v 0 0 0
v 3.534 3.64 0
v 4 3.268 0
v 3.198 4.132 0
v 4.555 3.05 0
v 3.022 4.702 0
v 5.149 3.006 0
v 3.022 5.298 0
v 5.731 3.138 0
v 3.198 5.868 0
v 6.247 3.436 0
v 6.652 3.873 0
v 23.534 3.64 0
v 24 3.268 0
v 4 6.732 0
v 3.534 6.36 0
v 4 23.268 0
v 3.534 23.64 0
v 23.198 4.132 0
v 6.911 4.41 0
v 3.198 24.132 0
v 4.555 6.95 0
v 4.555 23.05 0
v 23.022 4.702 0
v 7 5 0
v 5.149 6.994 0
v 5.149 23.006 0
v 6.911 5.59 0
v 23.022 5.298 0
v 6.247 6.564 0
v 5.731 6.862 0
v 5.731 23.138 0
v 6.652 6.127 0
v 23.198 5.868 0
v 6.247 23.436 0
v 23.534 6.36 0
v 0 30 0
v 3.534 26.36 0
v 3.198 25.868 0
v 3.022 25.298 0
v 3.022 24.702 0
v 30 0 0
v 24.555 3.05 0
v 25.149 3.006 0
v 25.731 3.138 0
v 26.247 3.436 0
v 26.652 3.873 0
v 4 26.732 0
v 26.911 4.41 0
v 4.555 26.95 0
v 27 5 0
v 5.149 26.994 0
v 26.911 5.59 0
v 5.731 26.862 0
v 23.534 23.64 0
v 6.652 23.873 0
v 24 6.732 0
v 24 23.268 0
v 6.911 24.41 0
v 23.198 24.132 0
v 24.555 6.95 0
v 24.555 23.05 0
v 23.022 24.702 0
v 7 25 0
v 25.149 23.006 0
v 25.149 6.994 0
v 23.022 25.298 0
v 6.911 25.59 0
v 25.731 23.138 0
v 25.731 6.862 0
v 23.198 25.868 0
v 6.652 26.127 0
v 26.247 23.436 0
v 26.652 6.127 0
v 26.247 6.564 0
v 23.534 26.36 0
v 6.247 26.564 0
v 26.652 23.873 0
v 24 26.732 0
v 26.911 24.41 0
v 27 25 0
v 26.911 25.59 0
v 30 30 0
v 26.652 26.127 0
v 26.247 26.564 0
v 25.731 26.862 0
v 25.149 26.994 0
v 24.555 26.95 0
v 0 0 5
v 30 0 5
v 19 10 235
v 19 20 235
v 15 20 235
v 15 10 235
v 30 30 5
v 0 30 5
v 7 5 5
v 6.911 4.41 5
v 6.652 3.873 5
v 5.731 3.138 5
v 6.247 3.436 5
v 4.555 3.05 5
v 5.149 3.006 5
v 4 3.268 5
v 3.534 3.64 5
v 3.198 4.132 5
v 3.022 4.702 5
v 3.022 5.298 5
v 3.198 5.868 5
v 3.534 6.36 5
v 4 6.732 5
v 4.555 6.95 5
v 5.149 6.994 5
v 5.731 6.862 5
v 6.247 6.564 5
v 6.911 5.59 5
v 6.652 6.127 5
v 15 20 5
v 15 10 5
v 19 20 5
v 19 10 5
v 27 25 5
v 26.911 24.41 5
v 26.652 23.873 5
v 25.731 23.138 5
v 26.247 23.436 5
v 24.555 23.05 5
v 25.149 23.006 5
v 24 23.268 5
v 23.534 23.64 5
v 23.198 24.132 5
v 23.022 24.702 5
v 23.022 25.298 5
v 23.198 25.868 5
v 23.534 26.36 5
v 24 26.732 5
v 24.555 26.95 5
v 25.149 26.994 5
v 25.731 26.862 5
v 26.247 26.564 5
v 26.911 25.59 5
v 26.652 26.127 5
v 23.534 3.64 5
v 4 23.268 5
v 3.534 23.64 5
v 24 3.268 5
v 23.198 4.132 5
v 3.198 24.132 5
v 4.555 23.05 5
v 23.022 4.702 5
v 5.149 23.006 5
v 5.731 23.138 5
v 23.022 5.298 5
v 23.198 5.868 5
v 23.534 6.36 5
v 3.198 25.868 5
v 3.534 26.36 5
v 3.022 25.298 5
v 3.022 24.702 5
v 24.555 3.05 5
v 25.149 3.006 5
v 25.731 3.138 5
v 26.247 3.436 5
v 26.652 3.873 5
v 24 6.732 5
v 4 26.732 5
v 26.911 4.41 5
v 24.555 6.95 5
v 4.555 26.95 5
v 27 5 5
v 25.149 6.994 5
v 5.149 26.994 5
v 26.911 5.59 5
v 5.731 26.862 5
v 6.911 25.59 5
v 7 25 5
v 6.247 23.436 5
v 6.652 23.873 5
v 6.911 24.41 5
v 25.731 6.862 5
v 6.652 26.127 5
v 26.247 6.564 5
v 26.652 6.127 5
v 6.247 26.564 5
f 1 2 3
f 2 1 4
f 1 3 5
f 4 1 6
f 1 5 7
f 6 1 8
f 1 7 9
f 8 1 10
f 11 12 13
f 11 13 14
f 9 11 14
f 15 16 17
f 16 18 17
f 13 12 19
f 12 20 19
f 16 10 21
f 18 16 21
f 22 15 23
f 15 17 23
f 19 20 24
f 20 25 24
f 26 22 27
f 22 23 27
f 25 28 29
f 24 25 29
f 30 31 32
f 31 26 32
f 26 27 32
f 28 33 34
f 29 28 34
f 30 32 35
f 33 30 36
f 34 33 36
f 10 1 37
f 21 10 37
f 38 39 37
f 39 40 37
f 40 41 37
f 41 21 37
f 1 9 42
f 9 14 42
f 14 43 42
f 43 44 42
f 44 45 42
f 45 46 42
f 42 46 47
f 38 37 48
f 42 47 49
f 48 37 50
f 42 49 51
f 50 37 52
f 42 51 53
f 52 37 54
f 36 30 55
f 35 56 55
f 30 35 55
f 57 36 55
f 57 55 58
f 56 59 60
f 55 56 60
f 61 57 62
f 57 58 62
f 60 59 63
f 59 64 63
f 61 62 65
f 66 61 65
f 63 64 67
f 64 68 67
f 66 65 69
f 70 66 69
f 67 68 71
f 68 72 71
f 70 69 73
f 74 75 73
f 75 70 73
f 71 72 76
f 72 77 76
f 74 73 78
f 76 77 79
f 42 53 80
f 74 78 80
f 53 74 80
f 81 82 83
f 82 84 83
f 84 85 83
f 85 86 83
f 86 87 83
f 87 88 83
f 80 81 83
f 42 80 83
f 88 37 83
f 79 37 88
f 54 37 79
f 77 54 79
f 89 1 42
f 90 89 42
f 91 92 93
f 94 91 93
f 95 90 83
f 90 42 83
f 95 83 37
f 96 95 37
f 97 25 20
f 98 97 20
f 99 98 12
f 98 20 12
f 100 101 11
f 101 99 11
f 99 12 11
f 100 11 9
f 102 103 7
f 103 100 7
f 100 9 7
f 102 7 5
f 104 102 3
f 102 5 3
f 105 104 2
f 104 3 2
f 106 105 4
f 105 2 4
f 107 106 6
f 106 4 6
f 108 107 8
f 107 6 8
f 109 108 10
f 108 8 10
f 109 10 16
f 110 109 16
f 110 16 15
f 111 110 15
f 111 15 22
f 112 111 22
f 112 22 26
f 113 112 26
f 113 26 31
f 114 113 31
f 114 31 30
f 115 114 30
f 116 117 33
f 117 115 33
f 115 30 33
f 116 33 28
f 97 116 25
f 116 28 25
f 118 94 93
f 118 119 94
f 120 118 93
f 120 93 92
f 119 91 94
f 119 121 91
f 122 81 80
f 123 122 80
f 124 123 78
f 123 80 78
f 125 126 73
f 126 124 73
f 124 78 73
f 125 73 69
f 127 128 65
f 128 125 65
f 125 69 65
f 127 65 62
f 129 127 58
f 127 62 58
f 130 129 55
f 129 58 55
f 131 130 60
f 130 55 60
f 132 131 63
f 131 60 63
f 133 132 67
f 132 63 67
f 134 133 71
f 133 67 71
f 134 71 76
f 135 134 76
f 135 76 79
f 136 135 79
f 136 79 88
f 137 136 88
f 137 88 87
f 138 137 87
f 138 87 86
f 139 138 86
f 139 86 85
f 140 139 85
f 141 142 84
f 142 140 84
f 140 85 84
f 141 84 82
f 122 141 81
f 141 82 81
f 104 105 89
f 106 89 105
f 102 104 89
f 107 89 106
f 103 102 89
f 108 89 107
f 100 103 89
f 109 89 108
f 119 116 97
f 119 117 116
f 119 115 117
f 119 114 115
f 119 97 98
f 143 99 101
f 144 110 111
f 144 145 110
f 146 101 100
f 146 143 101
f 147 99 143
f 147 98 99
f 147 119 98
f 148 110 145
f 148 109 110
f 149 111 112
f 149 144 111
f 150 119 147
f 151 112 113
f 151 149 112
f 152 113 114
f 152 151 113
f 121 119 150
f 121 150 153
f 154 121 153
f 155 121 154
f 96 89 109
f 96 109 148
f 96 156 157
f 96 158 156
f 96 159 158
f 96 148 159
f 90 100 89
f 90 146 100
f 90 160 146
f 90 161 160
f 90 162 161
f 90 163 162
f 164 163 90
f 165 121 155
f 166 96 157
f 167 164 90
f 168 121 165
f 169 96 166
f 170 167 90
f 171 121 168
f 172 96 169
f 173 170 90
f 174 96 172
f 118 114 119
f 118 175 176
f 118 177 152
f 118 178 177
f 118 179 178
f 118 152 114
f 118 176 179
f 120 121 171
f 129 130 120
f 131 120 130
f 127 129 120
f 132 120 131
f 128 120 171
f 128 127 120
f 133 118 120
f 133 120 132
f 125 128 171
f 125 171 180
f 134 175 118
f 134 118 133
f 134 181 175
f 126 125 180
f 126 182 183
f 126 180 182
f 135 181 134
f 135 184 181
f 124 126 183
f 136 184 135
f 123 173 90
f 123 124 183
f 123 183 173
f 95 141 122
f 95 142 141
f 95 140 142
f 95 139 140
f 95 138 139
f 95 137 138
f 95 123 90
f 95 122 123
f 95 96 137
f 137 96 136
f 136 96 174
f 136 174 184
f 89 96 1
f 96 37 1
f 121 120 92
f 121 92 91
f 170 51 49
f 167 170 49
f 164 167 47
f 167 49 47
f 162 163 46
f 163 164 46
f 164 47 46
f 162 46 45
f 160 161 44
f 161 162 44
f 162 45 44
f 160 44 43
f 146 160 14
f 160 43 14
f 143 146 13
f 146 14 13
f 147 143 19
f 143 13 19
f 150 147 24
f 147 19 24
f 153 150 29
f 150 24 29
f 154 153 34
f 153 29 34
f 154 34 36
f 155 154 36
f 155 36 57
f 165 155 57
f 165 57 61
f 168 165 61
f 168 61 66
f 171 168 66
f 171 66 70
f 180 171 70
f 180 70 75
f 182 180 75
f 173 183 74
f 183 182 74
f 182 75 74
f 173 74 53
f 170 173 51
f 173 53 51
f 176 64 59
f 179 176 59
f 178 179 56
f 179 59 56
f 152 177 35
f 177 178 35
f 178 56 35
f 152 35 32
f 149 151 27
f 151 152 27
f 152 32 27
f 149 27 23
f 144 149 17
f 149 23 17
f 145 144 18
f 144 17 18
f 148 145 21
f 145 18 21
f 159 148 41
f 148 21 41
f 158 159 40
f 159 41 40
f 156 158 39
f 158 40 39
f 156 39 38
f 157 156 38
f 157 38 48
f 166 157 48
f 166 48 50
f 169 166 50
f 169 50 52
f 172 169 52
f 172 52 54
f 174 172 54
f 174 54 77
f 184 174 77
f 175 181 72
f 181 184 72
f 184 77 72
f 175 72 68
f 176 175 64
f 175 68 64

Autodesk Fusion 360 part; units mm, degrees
sketch "Sketch1" plane through (0, 0, 0) normal (0, 0, 1) x (1, 0, 0)
  line L0 (0, 0) -> (30, 0)
  line L1 (30, 0) -> (30, 30)
  line L2 (30, 30) -> (0, 30)
  line L3 (0, 30) -> (0, 0)
  circle A0 centre (5, 25) radius 2
  circle A1 centre (25, 25) radius 2
  circle A2 centre (25, 5) radius 2
  circle A3 centre (5, 5) radius 2
  dimension "d1" = 30
  dimension "d2" = 30
  dimension "d3" = 4
  dimension "d4" = 5
  dimension "d5" = 5
  dimension "d6" = 4
  dimension "d7" = 4
  dimension "d8" = 4
  dimension "d9" = 20
  dimension "d10" = 20
  dimension "d11" = 20
  dimension "d12" = 20
  dimension "d13" = 5
  dimension "d14" = 5
extrude "Extrude1" add sketch "Sketch1" along normal blind 5
sketch "Sketch2" plane through (0, 0, 5) normal (0, 0, 1) x (-1, 0, 0)
  circle A0 centre (-5, -5) radius 2
  circle A1 centre (-25, -5) radius 2
  circle A2 centre (-5, -25) radius 2
  circle A3 centre (-25, -25) radius 2
  line L0 (0, -30) -> (0, 0)
  line L1 (0, 0) -> (-30, 0)
  line L2 (-30, 0) -> (-30, -30)
  line L3 (-30, -30) -> (0, -30)
  line L4 (-15, -20) -> (-19, -20)
  line L5 (-19, -20) -> (-19, -10)
  line L6 (-19, -10) -> (-15, -10)
  line L7 (-15, -10) -> (-15, -20)
  dimension "d17" = 4
  dimension "d18" = 10
  dimension "d19" = 15
  dimension "d20" = 10
extrude "Extrude3" add sketch "Sketch2" along normal blind 230 contours L4 L5 L6 L7
